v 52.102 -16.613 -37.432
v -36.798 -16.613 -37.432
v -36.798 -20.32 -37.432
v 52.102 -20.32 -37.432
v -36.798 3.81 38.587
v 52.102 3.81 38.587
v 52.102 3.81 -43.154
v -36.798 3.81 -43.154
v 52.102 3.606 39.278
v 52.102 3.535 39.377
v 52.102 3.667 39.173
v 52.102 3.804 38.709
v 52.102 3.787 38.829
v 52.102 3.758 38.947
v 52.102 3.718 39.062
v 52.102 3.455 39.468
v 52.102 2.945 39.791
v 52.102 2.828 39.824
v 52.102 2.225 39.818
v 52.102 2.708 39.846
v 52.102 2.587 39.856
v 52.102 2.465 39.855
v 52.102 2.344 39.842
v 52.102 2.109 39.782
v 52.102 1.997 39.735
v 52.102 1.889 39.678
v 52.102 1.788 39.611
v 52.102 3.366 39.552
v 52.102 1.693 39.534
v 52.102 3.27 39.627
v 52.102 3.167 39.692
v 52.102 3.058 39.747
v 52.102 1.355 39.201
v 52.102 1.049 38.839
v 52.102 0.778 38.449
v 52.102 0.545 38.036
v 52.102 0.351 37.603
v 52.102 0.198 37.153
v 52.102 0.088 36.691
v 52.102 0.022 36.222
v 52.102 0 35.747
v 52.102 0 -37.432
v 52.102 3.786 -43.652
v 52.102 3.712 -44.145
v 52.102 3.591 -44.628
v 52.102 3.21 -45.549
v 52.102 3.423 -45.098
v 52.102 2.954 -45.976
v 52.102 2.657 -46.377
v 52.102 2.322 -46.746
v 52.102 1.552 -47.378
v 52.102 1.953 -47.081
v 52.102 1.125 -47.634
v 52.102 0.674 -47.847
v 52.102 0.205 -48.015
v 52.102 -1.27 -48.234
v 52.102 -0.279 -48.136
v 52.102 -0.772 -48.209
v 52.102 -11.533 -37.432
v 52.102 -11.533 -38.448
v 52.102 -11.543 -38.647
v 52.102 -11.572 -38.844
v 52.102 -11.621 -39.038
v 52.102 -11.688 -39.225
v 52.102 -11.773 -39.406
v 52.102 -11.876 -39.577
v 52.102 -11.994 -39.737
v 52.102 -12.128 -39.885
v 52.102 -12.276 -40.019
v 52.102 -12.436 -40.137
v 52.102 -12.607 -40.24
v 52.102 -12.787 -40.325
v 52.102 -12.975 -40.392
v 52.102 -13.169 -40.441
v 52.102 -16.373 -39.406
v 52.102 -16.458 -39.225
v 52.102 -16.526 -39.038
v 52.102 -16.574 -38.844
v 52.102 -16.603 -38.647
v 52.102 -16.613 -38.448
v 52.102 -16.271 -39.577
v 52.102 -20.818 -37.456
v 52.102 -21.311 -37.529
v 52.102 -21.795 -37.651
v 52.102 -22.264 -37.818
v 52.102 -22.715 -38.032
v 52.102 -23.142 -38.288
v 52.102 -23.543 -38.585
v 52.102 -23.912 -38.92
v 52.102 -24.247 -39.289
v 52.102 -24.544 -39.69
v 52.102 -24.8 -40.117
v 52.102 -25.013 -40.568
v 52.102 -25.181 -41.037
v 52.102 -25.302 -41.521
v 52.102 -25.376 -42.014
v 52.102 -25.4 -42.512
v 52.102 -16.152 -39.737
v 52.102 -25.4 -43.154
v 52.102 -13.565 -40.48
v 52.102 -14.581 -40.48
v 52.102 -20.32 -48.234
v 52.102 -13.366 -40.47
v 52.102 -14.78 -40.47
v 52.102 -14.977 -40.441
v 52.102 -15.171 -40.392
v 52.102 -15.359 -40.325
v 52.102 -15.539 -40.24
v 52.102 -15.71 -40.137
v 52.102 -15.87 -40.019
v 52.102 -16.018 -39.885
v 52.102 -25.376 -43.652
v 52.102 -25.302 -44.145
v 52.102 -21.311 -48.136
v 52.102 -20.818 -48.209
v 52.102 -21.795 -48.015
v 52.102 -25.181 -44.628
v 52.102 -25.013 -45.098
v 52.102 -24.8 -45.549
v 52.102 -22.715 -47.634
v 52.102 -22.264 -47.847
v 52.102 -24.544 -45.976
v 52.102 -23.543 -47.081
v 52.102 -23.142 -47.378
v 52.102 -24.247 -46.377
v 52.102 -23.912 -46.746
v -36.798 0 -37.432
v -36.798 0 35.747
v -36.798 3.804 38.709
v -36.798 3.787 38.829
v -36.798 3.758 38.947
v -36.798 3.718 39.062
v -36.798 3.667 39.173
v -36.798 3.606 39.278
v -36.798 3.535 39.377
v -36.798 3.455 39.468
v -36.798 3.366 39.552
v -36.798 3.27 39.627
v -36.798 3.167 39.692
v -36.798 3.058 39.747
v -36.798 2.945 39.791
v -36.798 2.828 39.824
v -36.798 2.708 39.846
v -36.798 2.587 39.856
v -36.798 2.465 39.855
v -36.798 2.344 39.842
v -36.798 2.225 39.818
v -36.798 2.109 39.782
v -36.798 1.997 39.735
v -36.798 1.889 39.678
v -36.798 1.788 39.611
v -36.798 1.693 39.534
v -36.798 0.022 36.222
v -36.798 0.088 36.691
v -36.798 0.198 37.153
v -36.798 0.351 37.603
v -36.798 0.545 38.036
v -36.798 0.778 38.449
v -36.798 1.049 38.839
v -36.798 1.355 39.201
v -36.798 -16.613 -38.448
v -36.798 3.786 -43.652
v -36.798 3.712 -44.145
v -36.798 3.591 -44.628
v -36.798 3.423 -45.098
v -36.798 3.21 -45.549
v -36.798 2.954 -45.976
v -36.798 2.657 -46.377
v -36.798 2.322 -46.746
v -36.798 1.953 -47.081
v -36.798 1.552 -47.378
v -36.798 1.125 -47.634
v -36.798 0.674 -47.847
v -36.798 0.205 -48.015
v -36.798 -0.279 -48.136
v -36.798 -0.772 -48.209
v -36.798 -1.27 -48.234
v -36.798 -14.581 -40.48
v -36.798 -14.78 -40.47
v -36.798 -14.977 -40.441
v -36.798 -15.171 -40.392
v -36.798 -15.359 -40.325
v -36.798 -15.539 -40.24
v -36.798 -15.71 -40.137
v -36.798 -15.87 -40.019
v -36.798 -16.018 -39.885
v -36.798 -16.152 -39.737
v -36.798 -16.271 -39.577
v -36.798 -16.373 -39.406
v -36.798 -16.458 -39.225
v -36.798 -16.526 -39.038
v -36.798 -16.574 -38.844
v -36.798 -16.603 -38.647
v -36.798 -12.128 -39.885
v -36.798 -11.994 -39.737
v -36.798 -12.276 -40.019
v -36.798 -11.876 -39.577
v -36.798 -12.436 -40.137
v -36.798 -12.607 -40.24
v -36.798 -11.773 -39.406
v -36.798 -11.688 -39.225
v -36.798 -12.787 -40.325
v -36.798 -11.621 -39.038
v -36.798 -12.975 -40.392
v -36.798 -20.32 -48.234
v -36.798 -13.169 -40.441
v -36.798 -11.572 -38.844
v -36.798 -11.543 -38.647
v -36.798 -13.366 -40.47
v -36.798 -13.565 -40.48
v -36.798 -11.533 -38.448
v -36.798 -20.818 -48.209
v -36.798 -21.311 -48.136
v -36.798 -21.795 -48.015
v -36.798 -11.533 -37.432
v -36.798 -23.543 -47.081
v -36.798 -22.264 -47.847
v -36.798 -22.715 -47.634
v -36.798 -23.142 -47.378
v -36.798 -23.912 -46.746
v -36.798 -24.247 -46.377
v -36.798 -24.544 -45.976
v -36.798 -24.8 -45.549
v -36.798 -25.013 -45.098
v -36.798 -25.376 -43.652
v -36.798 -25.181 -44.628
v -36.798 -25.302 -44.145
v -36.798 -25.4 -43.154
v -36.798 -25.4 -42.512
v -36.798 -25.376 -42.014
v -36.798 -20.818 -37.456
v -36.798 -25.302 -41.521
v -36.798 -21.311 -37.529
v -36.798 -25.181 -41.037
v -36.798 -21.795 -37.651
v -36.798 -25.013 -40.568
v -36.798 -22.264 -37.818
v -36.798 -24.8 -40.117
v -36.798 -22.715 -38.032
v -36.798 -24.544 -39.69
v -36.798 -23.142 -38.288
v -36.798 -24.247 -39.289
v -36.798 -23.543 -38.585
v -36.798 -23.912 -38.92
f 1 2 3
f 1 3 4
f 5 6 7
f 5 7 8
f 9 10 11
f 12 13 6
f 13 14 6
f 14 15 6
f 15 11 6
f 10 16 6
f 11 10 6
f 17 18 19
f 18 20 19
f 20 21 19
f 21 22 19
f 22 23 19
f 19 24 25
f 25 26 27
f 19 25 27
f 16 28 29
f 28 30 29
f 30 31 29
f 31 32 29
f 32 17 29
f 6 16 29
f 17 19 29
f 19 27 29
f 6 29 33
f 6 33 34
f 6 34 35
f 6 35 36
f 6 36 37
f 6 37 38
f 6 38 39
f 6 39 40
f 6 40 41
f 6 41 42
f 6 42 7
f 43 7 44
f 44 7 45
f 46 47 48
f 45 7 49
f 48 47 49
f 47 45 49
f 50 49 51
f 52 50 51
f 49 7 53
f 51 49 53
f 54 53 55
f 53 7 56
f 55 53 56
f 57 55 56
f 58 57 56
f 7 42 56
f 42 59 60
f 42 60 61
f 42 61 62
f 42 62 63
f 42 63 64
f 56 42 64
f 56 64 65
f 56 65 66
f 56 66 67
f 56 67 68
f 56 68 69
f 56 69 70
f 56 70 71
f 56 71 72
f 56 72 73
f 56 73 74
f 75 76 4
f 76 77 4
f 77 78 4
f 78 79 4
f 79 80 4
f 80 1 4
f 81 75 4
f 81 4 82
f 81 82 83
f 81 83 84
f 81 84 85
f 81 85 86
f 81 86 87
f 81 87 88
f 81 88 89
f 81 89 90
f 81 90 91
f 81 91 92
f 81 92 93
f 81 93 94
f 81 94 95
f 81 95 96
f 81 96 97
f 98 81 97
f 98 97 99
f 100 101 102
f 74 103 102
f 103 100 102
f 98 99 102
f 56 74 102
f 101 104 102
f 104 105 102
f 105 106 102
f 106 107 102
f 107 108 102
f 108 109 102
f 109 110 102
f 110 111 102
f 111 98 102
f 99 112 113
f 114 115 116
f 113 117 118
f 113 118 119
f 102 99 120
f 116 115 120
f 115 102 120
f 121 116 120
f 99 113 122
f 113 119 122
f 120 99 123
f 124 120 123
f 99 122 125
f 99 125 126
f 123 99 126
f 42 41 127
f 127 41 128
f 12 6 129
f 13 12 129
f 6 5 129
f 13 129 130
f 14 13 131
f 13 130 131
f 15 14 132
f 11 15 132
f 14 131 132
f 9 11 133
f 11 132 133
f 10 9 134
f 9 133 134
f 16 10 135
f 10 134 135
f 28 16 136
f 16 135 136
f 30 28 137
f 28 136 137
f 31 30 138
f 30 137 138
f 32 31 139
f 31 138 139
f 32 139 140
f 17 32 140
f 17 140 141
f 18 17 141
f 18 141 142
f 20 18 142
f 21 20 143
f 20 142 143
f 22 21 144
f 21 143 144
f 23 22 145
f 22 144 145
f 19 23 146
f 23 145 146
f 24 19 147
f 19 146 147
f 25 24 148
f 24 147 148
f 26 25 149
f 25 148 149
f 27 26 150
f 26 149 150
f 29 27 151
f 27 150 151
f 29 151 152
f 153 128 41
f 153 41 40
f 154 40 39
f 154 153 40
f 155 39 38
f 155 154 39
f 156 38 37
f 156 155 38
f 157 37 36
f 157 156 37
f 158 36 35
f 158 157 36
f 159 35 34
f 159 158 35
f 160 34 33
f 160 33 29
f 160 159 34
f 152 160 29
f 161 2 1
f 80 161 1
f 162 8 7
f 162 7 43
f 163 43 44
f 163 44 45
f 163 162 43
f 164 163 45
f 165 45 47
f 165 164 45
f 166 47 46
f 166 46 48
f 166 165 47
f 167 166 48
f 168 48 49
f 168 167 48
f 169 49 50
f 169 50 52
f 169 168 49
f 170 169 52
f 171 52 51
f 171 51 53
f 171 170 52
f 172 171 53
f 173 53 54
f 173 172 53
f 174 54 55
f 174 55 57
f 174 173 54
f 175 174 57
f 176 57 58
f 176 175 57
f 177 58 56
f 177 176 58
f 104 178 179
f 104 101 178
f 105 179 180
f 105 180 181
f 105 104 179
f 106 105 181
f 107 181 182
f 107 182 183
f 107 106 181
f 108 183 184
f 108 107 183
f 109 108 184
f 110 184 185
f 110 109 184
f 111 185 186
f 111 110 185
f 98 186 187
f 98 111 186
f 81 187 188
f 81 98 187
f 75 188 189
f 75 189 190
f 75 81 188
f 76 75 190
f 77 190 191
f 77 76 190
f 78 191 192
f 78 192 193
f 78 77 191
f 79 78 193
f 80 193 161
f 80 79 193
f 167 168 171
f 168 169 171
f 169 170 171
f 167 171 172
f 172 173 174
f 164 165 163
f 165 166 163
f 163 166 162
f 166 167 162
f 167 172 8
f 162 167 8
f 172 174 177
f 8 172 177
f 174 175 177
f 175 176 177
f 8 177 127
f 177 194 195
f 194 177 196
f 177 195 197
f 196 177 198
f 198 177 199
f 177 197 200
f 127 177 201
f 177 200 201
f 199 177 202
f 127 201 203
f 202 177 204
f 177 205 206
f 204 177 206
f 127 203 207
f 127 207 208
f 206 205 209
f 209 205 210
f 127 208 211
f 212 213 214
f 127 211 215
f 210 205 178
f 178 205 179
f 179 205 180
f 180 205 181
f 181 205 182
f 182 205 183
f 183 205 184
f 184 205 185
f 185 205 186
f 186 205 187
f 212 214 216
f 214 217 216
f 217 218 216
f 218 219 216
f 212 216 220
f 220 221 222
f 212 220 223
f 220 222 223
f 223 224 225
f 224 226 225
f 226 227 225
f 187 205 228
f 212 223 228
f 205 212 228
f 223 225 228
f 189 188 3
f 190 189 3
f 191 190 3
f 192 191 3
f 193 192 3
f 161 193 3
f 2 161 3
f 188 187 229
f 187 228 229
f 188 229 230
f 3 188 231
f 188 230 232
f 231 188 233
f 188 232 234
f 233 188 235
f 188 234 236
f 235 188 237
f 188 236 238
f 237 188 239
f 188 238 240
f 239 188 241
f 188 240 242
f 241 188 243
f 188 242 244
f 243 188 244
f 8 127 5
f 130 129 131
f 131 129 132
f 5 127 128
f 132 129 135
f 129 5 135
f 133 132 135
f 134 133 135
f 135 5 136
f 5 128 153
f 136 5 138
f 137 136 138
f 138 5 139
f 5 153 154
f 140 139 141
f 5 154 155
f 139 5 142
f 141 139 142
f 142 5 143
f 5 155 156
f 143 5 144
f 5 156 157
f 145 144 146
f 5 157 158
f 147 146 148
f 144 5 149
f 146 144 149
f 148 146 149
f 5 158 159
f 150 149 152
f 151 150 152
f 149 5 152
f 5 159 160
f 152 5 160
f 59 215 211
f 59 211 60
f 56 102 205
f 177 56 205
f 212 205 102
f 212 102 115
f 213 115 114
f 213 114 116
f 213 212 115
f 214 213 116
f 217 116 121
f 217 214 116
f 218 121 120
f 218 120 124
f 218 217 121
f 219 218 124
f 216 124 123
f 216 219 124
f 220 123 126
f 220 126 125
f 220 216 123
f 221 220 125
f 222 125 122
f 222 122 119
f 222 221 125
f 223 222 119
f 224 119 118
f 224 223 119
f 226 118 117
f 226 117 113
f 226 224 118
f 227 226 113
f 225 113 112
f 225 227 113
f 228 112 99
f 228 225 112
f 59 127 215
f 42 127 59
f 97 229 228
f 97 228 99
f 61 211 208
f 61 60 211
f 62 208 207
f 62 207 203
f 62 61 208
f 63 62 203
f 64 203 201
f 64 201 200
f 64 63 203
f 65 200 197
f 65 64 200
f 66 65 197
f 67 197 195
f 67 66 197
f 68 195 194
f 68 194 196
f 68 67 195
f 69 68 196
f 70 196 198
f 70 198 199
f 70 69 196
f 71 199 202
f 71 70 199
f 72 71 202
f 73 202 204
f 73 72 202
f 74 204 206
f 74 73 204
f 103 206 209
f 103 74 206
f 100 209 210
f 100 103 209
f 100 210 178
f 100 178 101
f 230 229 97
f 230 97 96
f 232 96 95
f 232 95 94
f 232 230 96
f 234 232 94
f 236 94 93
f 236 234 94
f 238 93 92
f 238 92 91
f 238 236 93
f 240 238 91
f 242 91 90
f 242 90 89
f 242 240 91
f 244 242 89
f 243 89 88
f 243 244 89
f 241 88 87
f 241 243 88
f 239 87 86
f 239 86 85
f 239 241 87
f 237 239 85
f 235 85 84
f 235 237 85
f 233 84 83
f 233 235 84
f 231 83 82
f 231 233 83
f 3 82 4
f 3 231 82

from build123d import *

# Parameters (mm, degrees)
F0_W        = 88.9
F0_H        = 10.8020305634
F1_DEPTH    = 25.4
F3_W        = 88.9
F3_H        = 10.8020305634
F3_H_2      = 78.0979694366
F4_DEPTH    = 3.81
F5_W        = 88.9
F5_H        = 5.08
F6_DEPTH    = 3.048
F7_T1_DEPTH = 113.4934442484
F7_T3_DEPTH = 114.3
F8_R        = 1.27
F9_R        = 2.032


# Not quite as in the source:
# - a fillet or chamfer that OpenCascade refuses, or shapes differently, is made with other operations: its cross-section is extruded or revolved along the edge and cut away or added
# - a feature names something its author has since deleted; it is built from what else it names


with BuildPart() as f1:
    # F0 (on Front) → F1 (new body)
    with BuildSketch(Plane.XZ):
        with Locations((7.6519327545, -42.832814157)):
            Rectangle(F0_W, F0_H)
    extrude(amount=F1_DEPTH)

    # F3 (on face) → F4 (join)
    with BuildSketch(Plane(origin=(0, 0, 0), x_dir=(-1, 0, 0), z_dir=(0, 1, 0))):
        with Locations((-7.6519327545, -42.832814157)):
            Rectangle(F3_W, F3_H)
        with Locations((-7.6519327545, 1.617185843)):
            Rectangle(F3_W, F3_H_2)
    extrude(amount=F4_DEPTH)

    # F5 (on face) → F6 (cut)
    with BuildSketch(Plane.XY.offset(-37.4317988753)):
        with Locations((7.6519327545, -14.0730550206)):
            Rectangle(F5_W, F5_H)
    extrude(amount=-F6_DEPTH, mode=Mode.SUBTRACT)

    # F7: fillet of radius 5.08 on 4 edges, made by hand

    # F7_s2 → F7_t1 (cut)
    with BuildSketch(Plane.YZ.offset(-49.0947893697)):
        with BuildLine():
            ThreePointArc((0, 35.7474817116), (1.0639073716, 38.858333685), (3.81, 40.6661705613))
            Line((3.81, 40.6661705613), (0, 40.6661705613))
            Line((0, 40.6661705613), (0, 35.7474817116))
        make_face()
    extrude(amount=F7_T1_DEPTH, mode=Mode.SUBTRACT)

    # F7_s4 → F7_t3 (cut)
    with BuildSketch(Plane.YZ.offset(-49.4980672455)):
        with BuildLine():
            ThreePointArc((-25.4, -42.5117988753), (-23.9121024484, -38.9196964269), (-20.32, -37.4317988753))
            Line((-20.32, -37.4317988753), (-25.4, -37.4317988753))
            Line((-25.4, -37.4317988753), (-25.4, -42.5117988753))
        make_face()
        with BuildLine():
            ThreePointArc((-20.32, -48.2338294387), (-23.9121024484, -46.7459318871), (-25.4, -43.1538294387))
            Line((-25.4, -43.1538294387), (-25.4, -48.2338294387))
            Line((-25.4, -48.2338294387), (-20.32, -48.2338294387))
        make_face()
        with BuildLine():
            ThreePointArc((3.81, -43.1538294387), (2.3221024484, -46.7459318871), (-1.27, -48.2338294387))
            Line((-1.27, -48.2338294387), (3.81, -48.2338294387))
            Line((3.81, -48.2338294387), (3.81, -43.1538294387))
        make_face()
    extrude(amount=F7_T3_DEPTH, mode=Mode.SUBTRACT)

    # F8
    f8_edges = [f1.edges().sort_by_distance(p)[0] for p in [
        (7.651933, 3.81, 40.666171),
    ]]
    fillet(f8_edges, radius=F8_R)

    # F9
    f9_edges = [f1.edges().sort_by_distance(p)[0] for p in [
        (7.651933, -16.613055, -40.479799),
        (7.651933, -11.533055, -40.479799),
    ]]
    fillet(f9_edges, radius=F9_R)


solid = f1.part
